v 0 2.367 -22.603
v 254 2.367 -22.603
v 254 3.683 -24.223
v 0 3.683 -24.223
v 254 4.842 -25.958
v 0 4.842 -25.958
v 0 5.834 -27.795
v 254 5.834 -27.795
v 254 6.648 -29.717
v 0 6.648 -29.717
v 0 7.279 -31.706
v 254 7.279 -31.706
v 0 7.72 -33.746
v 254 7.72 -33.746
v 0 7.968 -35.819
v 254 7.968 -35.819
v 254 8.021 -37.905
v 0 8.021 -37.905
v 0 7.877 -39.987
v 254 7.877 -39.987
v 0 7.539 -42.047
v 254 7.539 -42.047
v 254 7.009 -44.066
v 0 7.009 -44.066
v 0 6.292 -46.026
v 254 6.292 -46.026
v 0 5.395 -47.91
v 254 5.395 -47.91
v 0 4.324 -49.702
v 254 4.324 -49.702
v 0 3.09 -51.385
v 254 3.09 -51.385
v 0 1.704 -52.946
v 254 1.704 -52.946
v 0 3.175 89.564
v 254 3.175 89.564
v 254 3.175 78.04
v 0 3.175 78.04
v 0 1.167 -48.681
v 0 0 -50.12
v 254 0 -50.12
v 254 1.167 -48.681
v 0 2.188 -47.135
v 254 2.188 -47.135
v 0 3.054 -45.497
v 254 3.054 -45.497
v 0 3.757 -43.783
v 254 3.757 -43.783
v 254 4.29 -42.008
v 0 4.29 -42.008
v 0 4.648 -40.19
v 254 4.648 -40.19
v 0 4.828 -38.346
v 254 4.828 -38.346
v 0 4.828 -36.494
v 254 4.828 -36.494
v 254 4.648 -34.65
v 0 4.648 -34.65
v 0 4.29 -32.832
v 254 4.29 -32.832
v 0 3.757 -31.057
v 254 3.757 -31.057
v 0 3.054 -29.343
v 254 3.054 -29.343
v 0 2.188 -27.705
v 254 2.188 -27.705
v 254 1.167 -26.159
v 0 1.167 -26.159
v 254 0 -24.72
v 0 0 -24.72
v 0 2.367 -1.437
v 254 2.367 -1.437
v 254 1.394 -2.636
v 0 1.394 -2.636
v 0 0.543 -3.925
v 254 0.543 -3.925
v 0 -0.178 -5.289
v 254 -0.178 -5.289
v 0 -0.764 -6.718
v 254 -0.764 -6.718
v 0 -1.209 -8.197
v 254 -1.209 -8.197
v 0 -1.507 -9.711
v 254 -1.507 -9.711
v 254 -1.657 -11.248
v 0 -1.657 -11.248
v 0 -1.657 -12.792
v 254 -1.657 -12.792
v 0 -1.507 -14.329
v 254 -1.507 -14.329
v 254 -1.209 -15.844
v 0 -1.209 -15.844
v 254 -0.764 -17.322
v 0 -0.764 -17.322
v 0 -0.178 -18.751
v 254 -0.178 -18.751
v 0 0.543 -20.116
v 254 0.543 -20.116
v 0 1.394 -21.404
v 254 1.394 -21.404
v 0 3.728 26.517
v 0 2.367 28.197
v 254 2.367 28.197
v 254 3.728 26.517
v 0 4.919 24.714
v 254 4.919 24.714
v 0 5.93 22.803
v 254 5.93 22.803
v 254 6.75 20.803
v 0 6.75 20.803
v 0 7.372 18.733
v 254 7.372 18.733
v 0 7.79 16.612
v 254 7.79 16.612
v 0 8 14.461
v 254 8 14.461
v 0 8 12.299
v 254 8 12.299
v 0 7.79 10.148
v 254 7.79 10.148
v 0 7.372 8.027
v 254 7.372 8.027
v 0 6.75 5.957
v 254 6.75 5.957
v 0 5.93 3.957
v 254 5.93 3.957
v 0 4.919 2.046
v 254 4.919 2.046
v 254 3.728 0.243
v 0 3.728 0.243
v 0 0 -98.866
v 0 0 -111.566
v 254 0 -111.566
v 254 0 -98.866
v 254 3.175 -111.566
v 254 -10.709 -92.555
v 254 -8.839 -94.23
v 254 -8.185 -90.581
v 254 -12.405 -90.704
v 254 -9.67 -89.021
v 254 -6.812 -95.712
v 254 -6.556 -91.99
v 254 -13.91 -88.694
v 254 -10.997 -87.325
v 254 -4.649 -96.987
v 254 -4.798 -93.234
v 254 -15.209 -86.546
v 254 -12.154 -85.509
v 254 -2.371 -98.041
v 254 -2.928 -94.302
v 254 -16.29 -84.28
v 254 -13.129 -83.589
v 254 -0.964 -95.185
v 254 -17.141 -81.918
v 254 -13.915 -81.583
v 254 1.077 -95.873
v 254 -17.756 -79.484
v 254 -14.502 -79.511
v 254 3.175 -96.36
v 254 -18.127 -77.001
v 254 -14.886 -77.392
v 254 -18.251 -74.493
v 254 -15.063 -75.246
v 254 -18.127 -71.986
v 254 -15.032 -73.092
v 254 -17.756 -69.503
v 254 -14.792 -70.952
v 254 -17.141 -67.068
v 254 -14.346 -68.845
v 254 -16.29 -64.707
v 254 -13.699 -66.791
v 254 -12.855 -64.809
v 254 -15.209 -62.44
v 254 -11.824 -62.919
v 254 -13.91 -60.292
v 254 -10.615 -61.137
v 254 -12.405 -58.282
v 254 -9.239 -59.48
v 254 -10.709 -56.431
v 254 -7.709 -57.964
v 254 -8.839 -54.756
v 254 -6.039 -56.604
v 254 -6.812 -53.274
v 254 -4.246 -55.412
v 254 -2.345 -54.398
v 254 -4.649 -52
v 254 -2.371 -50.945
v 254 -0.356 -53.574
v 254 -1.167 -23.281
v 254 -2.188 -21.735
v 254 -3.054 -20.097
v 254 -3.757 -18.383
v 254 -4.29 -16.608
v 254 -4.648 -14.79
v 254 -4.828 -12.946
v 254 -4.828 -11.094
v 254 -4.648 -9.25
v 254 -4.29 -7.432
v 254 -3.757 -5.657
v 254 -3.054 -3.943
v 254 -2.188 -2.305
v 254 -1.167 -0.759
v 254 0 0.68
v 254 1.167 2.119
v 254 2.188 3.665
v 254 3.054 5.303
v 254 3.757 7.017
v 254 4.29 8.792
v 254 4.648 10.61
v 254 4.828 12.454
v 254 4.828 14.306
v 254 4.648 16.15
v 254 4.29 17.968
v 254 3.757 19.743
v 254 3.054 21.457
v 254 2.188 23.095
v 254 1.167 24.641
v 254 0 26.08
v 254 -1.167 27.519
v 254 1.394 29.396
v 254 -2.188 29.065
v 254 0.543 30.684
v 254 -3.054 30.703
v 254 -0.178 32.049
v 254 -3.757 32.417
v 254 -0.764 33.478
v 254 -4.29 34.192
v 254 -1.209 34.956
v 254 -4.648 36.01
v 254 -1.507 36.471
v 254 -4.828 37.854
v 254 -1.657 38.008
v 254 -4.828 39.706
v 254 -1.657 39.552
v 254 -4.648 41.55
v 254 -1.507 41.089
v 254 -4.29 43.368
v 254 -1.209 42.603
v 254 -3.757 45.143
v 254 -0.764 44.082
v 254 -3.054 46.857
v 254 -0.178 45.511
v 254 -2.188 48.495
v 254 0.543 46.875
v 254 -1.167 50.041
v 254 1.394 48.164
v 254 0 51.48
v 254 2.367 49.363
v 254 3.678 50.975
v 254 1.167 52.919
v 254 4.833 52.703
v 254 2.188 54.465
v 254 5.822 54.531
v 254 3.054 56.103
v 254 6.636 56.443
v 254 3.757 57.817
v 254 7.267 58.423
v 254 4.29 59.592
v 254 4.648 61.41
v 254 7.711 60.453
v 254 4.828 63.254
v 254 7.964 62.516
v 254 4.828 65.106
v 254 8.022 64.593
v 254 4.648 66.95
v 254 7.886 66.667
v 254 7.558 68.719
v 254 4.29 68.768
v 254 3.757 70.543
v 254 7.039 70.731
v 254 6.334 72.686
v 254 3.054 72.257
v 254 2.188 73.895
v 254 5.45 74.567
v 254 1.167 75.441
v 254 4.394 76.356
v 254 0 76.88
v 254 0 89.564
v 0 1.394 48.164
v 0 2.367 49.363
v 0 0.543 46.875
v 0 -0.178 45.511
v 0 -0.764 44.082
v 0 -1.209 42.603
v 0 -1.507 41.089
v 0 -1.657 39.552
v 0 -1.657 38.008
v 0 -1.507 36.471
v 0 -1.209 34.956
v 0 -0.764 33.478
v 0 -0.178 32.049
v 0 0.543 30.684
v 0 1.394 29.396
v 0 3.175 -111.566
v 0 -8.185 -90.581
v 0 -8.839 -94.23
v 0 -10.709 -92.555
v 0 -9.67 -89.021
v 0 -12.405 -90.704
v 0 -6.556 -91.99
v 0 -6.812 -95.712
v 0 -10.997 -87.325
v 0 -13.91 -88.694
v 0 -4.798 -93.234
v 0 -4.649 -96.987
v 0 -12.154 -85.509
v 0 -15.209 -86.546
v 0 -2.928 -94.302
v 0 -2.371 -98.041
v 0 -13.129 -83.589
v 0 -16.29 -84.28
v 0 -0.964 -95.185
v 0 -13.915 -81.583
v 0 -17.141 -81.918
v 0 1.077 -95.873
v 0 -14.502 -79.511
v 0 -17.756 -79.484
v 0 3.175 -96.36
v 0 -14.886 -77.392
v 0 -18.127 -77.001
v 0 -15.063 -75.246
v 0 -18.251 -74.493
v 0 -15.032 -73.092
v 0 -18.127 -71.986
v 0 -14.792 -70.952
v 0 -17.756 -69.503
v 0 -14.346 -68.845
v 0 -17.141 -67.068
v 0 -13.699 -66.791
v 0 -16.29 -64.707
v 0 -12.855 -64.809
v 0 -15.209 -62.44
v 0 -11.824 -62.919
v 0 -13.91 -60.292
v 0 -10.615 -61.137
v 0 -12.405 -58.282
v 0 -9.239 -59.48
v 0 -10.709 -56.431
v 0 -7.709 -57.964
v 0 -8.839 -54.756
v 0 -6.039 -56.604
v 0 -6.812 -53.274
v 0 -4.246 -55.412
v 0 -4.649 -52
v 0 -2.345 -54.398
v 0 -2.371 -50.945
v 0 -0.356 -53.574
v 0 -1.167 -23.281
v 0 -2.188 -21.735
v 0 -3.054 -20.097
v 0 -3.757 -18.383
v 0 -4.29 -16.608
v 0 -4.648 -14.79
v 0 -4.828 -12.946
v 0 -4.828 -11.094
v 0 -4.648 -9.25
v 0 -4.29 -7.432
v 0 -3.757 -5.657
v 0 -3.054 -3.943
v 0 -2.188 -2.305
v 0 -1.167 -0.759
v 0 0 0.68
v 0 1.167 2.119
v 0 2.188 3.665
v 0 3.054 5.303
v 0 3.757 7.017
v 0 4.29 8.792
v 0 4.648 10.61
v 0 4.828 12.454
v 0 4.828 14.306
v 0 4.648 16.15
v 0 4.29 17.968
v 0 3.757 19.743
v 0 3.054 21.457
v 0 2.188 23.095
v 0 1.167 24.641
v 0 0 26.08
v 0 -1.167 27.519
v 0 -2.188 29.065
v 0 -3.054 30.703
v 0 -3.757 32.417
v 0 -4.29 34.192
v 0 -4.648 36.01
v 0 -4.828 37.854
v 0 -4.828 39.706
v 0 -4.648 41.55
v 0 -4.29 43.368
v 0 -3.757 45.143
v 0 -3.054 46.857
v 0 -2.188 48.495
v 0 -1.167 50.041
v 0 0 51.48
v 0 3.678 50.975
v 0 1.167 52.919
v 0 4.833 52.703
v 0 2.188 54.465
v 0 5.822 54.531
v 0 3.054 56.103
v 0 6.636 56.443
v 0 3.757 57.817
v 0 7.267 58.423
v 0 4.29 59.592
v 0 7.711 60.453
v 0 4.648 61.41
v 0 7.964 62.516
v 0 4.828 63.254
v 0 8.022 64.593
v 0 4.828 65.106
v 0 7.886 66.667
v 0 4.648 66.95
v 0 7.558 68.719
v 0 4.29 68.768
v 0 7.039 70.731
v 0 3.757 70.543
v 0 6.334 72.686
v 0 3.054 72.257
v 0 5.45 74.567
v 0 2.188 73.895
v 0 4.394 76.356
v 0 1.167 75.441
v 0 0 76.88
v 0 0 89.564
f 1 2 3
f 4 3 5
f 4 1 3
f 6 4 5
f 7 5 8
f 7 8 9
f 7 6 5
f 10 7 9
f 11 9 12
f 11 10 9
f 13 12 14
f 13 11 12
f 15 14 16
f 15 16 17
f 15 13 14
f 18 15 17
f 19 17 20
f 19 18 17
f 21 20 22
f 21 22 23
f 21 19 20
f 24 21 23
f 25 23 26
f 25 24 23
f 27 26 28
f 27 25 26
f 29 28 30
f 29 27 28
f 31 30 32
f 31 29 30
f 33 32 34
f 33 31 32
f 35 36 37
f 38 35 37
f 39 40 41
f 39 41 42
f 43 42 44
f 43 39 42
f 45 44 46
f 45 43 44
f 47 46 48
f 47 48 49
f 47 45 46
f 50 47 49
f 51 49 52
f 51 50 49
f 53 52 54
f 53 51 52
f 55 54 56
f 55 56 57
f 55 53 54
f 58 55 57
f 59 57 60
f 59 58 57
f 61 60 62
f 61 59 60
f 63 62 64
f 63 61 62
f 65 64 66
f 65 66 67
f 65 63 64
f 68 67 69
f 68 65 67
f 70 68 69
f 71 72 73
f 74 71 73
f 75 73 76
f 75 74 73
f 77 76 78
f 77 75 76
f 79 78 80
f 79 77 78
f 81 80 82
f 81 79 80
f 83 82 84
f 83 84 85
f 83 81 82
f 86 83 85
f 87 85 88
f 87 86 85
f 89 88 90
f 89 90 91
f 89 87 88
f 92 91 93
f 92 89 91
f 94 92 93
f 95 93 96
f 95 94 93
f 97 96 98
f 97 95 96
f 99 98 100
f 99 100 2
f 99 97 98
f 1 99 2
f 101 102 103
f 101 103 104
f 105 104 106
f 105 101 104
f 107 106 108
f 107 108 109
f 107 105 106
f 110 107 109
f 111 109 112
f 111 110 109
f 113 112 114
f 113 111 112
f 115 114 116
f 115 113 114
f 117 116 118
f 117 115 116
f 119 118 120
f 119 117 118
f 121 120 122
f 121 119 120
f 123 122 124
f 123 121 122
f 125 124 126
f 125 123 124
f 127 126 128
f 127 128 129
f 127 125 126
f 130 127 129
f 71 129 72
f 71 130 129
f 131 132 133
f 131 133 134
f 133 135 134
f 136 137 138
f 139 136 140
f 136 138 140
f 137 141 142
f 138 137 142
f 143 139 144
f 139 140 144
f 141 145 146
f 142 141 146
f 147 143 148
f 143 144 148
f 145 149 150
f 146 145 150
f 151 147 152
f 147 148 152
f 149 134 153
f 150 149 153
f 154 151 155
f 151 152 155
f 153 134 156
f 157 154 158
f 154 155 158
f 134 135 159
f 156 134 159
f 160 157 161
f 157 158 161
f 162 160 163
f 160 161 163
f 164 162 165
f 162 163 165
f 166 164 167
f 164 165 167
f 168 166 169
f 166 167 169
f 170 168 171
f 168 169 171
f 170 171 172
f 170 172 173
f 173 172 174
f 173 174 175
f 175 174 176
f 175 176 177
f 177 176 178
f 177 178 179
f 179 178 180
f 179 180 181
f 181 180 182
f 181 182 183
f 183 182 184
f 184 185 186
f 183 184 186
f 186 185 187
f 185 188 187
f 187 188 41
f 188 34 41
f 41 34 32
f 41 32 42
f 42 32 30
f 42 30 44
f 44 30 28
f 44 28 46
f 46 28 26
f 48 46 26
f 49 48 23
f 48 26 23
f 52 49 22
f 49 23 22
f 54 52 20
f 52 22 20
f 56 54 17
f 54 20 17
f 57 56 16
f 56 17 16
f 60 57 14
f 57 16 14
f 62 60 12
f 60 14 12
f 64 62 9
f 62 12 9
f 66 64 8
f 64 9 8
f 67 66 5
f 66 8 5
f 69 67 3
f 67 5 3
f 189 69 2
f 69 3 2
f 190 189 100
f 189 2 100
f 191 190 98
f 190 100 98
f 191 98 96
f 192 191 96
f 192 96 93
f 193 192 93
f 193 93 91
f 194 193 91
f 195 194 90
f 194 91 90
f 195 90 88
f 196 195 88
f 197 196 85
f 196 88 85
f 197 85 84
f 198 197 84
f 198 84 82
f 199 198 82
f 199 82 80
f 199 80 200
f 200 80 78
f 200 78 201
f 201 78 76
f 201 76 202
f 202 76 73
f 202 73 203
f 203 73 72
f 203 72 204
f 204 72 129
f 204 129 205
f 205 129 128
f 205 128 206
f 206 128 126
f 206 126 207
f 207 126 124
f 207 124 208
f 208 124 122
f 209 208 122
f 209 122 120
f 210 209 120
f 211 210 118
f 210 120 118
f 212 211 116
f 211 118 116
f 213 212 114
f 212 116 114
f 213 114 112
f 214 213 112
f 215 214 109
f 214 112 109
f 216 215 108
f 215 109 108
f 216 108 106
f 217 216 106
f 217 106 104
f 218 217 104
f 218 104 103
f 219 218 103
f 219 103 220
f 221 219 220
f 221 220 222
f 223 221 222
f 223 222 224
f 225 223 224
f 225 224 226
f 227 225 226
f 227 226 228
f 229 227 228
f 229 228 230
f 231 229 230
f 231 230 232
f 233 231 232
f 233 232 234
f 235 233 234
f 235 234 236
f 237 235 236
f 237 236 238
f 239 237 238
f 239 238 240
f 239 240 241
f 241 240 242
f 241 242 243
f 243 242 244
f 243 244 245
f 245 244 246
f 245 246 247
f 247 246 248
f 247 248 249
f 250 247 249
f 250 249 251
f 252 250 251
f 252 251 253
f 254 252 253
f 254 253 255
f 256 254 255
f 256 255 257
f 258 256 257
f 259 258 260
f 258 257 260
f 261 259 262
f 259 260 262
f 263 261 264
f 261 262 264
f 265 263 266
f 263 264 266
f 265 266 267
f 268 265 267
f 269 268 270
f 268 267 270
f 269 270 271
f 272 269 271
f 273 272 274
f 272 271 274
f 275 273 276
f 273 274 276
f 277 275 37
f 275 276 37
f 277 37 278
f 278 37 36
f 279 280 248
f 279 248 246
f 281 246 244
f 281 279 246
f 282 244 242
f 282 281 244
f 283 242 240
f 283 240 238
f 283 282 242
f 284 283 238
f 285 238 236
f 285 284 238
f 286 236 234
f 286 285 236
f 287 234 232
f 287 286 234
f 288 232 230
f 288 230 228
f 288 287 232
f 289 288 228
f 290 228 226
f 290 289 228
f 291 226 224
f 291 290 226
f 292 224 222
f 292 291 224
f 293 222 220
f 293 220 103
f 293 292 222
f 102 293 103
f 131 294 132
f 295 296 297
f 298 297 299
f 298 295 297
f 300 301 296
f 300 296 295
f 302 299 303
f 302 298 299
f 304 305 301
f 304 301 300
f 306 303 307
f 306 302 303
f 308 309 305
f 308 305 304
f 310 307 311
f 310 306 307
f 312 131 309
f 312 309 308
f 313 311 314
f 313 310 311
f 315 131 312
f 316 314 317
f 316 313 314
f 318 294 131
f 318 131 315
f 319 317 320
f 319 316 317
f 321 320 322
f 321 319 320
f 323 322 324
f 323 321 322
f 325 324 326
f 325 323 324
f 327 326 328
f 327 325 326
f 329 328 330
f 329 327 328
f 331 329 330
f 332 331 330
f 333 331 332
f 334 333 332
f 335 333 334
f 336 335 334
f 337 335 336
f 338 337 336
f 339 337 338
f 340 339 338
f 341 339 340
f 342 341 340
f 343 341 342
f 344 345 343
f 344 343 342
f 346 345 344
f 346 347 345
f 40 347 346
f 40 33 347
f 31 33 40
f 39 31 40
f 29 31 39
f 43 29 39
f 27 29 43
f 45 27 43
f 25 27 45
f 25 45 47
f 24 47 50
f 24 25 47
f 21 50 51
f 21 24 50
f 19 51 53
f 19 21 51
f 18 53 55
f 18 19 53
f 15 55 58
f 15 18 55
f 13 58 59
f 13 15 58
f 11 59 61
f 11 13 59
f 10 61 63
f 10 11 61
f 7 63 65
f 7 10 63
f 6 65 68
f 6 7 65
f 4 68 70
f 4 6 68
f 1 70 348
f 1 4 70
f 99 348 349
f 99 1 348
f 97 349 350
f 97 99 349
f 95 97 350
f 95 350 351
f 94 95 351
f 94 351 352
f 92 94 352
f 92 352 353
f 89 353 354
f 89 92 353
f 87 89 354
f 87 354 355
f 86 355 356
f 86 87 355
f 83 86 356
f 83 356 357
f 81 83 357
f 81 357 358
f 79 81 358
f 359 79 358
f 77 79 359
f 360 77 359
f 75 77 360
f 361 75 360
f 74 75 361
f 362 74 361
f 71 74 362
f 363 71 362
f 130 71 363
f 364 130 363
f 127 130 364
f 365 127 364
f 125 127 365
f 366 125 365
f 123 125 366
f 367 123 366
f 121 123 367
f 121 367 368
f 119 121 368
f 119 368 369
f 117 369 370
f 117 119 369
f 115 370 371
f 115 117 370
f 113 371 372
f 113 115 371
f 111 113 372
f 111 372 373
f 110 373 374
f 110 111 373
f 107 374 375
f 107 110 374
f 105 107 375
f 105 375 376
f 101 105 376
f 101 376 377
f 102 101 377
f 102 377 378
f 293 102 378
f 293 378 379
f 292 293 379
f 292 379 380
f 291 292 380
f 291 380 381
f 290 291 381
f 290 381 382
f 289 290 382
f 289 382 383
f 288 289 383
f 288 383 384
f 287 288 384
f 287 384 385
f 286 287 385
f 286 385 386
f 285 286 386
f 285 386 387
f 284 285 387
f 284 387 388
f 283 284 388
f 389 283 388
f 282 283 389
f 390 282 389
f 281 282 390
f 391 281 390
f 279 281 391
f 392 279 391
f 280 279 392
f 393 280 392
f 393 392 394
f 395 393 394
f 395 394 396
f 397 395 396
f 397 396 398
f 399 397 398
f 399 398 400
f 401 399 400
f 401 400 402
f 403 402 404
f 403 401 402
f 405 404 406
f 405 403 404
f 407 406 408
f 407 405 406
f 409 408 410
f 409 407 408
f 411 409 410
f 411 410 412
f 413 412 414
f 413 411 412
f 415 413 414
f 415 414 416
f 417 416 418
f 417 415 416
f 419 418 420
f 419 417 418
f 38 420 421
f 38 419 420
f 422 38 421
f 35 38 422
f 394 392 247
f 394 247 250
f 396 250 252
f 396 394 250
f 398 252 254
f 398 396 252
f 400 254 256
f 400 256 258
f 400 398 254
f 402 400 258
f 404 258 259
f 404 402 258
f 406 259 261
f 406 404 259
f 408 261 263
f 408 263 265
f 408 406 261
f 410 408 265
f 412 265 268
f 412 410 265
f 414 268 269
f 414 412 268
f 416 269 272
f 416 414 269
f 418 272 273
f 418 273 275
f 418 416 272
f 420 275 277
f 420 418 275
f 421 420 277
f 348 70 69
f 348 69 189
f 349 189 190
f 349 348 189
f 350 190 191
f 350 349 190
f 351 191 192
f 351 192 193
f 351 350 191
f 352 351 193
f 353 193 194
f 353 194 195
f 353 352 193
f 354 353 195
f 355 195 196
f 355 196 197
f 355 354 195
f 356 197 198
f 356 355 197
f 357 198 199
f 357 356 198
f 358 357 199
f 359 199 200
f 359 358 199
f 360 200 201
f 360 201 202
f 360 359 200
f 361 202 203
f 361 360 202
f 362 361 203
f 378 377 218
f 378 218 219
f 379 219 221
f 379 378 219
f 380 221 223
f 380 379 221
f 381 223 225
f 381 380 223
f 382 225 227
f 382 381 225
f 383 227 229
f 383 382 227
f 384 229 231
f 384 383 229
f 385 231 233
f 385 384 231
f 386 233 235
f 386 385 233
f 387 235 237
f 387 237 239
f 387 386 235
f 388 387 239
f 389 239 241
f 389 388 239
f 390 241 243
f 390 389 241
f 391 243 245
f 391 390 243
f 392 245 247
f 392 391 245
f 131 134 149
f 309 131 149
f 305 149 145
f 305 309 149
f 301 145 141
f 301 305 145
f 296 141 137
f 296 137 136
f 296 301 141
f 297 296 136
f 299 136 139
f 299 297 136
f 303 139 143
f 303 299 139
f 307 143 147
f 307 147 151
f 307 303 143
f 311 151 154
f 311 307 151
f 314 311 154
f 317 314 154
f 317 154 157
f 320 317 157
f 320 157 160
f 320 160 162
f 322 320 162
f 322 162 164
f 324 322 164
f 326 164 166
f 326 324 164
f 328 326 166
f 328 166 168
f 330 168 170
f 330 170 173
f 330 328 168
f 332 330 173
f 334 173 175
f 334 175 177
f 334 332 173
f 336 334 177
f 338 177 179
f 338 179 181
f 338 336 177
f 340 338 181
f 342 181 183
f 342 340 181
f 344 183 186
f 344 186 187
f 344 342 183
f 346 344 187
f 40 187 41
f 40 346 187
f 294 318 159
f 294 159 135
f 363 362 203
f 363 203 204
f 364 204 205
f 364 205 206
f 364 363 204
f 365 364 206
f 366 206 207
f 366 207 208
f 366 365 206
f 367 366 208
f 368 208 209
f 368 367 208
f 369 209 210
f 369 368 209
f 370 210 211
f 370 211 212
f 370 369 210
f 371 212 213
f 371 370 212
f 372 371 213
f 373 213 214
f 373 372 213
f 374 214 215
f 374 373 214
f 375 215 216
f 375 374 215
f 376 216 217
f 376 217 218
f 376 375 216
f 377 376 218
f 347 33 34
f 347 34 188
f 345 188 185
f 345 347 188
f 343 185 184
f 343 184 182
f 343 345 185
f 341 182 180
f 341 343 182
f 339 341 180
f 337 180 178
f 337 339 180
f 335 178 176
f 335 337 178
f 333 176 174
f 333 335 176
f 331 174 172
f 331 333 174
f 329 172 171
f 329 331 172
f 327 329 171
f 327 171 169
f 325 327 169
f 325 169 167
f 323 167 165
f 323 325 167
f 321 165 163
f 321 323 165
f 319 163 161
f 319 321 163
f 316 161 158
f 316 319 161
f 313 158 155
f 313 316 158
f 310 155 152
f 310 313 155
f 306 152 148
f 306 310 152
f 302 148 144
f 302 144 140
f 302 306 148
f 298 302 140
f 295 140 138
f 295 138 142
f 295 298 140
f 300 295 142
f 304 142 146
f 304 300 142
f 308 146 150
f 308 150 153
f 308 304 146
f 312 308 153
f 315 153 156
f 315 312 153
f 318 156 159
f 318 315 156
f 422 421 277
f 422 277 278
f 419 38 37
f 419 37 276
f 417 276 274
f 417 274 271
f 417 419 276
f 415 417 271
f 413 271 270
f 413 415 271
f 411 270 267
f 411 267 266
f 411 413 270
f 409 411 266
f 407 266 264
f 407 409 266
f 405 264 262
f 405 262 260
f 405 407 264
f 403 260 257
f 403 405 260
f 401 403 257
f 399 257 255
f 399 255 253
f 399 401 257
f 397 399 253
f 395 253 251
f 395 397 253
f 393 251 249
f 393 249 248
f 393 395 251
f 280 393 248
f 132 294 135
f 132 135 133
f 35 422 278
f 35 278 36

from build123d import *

# Parameters (mm, degrees)
BOSS_EXTRUDE4_DEPTH = 254


with BuildPart() as part:
    # Sketch1 → Boss-Extrude4 (new body)
    with BuildSketch(Plane(origin=(0, 0, 0), x_dir=(0, 0, -1), z_dir=(1, 0, 0))):
        with BuildLine():
            Line((-76.879940582, 0), (-89.563831565, 0))
            Line((-89.563831565, 0), (-89.563831565, 3.175))
            Line((-89.563831565, 3.175), (-78.039725897, 3.175))
            ThreePointArc((-78.039725897, 3.175), (-63.553584925, 8.017140461), (-49.363273916, 2.366505276))
            ThreePointArc((-49.363273916, 2.366505276), (-38.779940582, -1.675968343), (-28.196607249, 2.366505276))
            ThreePointArc((-28.196607249, 2.366505276), (-13.379940582, 8.025968343), (1.436726084, 2.366505276))
            ThreePointArc((1.436726084, 2.366505276), (12.020059418, -1.675968343), (22.603392751, 2.366505276))
            ThreePointArc((22.603392751, 2.366505276), (37.905111105, 8.020674683), (52.945511479, 1.704142972))
            ThreePointArc((52.945511479, 1.704142972), (75.245720478, -15.063067291), (96.359970712, 3.175))
            Line((96.359970712, 3.175), (111.566304511, 3.175))
            Line((111.566304511, 3.175), (111.566304511, 0))
            Line((111.566304511, 0), (98.866304511, 0))
            ThreePointArc((98.866304511, 0), (74.493181964, -18.250811422), (50.120059418, 0))
            ThreePointArc((50.120059418, 0), (37.420059418, 4.850968343), (24.720059418, 0))
            ThreePointArc((24.720059418, 0), (12.020059418, -4.850968343), (-0.679940582, 0))
            ThreePointArc((-0.679940582, 0), (-13.379940582, 4.850968343), (-26.079940582, 0))
            ThreePointArc((-26.079940582, 0), (-38.779940582, -4.850968343), (-51.479940582, 0))
            ThreePointArc((-51.479940582, 0), (-64.179940582, 4.850968343), (-76.879940582, 0))
        make_face()
    extrude(amount=BOSS_EXTRUDE4_DEPTH)


solid = part.part
